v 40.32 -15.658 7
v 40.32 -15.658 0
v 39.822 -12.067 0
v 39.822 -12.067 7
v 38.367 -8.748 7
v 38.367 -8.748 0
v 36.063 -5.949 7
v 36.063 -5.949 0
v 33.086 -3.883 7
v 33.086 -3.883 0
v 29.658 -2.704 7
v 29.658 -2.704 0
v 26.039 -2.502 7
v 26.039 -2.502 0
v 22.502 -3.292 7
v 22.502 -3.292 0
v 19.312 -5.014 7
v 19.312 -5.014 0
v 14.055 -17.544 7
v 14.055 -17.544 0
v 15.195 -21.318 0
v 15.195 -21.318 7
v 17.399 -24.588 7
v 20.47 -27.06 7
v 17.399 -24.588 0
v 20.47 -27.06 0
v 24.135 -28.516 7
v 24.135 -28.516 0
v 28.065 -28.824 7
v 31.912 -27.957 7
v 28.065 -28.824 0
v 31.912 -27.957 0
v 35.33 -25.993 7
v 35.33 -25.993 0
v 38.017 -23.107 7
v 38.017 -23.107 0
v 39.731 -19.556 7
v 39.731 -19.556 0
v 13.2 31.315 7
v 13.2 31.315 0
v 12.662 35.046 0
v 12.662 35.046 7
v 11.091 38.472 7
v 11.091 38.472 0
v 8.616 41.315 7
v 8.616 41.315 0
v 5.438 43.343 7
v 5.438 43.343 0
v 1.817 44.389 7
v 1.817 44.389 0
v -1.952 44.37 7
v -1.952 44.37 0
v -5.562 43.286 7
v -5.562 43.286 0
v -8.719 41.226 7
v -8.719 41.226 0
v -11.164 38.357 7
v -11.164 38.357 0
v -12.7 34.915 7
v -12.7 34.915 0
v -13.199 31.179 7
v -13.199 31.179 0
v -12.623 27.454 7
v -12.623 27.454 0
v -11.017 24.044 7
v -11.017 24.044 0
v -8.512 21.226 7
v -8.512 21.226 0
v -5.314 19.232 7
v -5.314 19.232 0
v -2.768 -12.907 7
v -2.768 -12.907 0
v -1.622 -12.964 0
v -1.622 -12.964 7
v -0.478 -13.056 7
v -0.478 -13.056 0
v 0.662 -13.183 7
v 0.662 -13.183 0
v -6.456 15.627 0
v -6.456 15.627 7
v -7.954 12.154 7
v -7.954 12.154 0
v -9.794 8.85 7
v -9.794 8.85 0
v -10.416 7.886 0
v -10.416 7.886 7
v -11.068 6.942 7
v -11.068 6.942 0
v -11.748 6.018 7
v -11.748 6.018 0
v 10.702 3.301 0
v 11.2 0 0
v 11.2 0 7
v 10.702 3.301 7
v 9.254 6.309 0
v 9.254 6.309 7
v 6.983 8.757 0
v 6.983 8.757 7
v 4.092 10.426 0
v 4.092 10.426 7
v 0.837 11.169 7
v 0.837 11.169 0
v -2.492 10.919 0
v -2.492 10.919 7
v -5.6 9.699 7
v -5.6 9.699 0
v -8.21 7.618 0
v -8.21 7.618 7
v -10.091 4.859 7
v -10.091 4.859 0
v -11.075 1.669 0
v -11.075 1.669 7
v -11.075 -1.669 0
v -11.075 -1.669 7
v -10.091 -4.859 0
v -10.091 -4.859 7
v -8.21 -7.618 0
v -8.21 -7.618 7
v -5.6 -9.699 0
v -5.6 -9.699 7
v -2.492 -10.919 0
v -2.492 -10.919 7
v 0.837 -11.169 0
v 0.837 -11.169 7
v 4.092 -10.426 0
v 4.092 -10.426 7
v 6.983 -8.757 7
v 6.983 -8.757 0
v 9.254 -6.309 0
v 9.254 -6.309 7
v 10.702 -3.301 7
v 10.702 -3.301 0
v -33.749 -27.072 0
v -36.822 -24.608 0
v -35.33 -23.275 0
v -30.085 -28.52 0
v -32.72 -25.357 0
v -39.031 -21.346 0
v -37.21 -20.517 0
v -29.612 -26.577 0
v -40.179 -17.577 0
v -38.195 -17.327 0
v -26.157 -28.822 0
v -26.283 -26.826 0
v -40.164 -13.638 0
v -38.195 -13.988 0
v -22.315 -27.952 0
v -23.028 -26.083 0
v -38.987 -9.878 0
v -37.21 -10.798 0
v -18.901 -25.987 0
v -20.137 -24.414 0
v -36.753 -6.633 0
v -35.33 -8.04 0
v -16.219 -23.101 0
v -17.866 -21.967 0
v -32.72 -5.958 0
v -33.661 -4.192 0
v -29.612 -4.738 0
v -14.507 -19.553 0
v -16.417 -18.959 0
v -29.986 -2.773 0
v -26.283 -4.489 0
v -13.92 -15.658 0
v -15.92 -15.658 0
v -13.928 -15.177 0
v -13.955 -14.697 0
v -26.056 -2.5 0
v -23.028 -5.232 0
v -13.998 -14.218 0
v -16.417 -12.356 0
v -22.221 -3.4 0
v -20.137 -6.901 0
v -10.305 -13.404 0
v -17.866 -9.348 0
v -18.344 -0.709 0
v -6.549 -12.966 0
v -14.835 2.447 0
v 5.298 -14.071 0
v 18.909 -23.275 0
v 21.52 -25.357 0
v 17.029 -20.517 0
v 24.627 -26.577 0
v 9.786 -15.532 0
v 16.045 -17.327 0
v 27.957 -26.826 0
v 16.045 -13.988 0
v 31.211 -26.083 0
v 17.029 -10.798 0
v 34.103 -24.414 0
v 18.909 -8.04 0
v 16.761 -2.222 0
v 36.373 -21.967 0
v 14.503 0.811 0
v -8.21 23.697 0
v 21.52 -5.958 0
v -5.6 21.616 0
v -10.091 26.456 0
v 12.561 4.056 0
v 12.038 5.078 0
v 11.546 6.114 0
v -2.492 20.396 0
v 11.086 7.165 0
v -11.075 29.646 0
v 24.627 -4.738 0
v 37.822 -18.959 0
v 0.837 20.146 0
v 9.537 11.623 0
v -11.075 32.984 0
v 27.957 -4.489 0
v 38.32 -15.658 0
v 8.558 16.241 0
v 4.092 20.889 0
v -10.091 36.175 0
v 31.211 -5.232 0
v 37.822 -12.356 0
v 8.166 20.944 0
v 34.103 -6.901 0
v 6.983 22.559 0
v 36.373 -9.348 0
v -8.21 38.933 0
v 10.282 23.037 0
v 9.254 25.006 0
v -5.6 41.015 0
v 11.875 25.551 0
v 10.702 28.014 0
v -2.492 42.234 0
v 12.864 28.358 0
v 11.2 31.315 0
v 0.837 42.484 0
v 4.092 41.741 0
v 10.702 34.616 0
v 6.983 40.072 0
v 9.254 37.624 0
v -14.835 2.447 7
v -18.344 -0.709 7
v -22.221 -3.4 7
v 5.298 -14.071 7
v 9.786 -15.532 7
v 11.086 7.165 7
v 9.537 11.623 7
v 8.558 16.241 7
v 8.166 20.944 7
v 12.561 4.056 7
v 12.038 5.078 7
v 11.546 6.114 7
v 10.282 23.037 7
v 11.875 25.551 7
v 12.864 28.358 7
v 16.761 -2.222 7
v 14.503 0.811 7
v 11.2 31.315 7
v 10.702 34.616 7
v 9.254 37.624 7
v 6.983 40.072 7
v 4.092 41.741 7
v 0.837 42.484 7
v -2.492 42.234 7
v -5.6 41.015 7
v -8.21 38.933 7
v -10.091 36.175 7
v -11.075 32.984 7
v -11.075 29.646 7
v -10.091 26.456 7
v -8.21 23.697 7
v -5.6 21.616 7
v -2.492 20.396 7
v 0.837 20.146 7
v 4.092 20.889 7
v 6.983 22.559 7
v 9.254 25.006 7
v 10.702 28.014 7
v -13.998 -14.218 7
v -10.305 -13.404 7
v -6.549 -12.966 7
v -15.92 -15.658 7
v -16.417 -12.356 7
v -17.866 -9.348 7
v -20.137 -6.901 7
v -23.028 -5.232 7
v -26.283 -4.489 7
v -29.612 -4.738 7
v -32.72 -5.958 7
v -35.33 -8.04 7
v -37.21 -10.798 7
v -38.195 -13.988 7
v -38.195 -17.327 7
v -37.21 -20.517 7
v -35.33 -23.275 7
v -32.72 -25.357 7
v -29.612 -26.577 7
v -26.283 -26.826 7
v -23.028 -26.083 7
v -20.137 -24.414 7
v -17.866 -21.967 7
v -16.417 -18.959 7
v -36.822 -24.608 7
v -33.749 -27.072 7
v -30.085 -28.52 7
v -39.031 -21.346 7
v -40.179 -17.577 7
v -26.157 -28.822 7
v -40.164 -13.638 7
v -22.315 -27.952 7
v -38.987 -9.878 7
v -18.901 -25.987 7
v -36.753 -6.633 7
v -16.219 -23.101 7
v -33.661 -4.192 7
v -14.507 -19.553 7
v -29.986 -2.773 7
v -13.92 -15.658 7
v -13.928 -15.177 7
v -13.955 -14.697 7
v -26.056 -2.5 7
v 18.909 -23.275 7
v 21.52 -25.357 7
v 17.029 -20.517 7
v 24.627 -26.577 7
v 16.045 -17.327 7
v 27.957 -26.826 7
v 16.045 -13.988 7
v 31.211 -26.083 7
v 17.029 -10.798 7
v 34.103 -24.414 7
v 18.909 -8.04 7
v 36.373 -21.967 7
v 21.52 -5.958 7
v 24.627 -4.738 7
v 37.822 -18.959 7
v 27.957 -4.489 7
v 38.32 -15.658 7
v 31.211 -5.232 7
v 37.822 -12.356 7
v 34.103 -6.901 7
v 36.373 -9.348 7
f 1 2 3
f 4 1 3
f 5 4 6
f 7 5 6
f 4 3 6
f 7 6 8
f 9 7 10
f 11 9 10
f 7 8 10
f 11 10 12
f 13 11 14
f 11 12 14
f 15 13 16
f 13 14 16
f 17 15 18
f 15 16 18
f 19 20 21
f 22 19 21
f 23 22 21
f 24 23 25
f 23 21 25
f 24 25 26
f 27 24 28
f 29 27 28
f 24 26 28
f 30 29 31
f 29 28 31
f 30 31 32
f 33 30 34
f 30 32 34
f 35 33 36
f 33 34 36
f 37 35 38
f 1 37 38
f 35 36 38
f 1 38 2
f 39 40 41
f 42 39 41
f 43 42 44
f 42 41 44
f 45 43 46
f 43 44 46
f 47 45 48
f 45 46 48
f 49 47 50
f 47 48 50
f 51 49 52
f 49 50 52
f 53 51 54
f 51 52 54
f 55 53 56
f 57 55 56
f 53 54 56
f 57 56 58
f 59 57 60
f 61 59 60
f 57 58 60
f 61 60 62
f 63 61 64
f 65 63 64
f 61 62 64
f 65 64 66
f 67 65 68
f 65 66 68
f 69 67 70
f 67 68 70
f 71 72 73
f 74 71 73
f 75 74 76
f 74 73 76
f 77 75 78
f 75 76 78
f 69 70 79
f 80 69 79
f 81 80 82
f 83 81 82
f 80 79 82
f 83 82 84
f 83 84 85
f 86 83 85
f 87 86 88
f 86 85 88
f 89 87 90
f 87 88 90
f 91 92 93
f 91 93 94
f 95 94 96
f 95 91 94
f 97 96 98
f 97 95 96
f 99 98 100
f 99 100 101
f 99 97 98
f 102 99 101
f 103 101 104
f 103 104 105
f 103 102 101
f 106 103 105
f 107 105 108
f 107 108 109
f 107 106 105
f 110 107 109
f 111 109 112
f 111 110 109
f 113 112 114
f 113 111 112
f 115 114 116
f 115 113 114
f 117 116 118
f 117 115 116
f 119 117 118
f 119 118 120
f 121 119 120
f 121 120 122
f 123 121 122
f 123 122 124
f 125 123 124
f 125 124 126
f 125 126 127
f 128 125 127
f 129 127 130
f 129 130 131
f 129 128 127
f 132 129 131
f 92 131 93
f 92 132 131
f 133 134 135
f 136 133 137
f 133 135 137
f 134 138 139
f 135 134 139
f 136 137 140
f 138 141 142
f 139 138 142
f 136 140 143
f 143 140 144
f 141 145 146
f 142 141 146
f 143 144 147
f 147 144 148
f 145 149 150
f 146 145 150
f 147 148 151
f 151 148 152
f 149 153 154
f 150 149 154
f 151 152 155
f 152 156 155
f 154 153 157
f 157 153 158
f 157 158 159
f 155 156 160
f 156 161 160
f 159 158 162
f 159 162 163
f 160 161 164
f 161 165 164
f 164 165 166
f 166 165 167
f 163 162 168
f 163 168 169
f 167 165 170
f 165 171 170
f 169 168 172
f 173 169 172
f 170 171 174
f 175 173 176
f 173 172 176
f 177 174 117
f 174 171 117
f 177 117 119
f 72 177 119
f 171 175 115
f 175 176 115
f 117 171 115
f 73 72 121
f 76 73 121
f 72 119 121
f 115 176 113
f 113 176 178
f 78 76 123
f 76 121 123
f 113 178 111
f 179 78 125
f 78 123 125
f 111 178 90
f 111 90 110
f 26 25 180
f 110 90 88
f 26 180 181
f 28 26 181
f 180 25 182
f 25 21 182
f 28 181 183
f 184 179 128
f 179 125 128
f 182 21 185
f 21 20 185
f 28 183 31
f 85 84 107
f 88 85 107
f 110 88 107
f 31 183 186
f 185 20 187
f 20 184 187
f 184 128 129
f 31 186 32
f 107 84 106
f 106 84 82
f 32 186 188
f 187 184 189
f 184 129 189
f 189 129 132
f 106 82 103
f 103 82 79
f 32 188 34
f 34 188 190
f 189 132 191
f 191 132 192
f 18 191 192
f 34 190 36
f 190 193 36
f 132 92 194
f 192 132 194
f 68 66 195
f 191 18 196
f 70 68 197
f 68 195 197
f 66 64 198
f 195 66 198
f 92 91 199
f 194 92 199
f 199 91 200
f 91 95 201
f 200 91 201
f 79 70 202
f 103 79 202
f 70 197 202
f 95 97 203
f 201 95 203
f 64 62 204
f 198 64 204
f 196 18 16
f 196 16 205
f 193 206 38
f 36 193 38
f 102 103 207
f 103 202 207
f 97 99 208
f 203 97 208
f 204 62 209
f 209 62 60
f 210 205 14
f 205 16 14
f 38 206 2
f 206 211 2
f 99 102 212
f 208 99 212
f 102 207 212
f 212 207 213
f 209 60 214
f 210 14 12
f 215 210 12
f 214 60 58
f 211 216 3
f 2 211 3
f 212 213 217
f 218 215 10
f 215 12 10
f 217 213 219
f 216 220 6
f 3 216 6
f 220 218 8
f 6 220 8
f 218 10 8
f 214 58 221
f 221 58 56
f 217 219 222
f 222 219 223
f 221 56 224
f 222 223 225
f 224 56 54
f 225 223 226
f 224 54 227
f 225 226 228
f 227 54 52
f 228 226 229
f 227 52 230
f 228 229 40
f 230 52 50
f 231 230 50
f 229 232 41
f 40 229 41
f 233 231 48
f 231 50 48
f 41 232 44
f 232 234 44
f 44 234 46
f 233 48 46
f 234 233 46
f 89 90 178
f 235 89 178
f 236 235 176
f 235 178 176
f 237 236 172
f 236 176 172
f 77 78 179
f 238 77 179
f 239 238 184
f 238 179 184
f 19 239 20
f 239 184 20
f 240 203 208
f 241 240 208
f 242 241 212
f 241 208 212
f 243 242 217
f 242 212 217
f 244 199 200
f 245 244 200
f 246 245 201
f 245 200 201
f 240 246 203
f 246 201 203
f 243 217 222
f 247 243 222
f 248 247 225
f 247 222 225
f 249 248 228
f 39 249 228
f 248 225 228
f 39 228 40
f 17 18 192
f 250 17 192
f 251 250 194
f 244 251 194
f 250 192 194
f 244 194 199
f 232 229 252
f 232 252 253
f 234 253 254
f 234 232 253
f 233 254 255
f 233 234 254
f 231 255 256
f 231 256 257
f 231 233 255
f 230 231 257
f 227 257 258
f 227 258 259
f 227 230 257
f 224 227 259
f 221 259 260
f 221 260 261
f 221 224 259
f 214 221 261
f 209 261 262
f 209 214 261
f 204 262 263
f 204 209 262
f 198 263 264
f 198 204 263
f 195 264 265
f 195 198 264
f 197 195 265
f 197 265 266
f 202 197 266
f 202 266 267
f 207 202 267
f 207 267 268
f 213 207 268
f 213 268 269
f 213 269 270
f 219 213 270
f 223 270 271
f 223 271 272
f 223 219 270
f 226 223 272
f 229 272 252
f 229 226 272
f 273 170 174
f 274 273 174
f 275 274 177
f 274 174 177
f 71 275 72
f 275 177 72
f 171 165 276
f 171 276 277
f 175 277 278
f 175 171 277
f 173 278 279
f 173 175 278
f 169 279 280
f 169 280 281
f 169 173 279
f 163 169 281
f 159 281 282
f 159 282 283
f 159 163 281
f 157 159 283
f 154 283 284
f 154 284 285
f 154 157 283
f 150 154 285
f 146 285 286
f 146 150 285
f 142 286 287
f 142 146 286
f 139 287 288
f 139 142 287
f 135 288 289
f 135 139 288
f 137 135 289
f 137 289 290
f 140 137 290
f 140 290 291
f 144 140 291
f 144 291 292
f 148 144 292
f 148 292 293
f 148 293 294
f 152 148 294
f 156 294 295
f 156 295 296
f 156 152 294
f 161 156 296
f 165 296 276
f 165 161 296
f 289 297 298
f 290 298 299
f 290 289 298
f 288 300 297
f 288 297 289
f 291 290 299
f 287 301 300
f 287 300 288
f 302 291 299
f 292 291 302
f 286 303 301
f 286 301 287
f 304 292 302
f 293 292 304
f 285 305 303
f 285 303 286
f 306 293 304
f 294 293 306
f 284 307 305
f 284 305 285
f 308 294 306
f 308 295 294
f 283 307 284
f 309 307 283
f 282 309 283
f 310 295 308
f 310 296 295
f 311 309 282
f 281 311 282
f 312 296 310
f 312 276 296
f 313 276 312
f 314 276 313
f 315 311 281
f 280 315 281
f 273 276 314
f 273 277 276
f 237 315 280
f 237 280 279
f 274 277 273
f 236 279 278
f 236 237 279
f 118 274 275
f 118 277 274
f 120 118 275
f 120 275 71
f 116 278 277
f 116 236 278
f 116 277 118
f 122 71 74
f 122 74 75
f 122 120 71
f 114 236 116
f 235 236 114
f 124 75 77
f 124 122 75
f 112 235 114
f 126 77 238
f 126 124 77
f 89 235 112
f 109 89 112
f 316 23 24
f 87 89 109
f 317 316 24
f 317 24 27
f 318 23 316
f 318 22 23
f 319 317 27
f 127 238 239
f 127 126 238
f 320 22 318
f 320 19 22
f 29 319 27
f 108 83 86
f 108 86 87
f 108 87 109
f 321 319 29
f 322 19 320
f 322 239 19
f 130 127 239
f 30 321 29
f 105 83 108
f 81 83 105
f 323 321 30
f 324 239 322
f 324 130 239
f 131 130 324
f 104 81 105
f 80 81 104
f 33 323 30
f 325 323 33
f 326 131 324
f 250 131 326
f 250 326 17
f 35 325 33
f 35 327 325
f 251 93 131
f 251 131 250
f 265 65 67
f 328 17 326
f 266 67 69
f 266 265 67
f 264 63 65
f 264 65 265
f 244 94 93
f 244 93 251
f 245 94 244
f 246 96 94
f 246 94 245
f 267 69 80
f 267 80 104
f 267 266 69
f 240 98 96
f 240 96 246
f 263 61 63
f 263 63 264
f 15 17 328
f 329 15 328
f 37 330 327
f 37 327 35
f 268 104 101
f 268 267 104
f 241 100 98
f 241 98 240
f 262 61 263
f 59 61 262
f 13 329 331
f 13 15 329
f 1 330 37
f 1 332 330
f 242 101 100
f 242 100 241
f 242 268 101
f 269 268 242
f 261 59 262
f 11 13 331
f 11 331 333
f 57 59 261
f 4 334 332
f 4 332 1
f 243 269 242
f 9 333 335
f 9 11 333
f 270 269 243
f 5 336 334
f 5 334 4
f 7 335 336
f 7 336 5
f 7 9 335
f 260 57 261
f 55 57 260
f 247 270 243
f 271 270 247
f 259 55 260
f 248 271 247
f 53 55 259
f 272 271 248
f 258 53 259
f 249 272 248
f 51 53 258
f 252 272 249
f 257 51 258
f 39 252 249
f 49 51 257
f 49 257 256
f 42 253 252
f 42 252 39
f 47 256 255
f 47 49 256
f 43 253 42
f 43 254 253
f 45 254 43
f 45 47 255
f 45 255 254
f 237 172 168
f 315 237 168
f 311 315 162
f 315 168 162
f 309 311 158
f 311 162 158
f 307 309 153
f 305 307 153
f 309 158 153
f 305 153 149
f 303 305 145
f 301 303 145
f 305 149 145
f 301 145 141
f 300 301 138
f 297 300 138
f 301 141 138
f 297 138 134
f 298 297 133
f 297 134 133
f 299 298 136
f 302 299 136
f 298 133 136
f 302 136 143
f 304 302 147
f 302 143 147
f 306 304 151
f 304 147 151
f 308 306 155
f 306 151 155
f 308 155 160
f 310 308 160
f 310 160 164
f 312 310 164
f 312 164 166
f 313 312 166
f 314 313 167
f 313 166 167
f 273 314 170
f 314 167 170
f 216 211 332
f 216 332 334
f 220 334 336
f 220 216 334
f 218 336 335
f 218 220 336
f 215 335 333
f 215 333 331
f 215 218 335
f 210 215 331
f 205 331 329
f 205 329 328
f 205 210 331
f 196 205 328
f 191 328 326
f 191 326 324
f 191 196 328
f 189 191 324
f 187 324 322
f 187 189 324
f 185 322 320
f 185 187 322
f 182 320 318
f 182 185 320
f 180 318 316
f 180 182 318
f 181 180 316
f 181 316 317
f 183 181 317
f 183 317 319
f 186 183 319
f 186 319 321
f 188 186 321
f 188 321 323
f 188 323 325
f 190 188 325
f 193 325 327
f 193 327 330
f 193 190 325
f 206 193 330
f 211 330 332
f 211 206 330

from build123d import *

# Parameters (mm, degrees)
F0_R     = 11.2
F1_DEPTH = 7


with BuildPart() as f1:
    # F0 (on Top) → F1 (new body)
    with BuildSketch(Plane.XY):
        with BuildLine():
            ThreePointArc((-5.3140176456, 19.2319211805), (1.6632130225, 18.2202199581), (8.1659804164, 20.9440597808))
            ThreePointArc((8.1659804164, 20.9440597808), (11.8749935052, 25.5509452113), (13.2, 31.3150174916))
            ThreePointArc((13.2, 31.3150174916), (-7.2143941907, 42.3690898842), (-5.3140176456, 19.2319211805))
        make_face()
        with Locations((0, 31.3150174916)):
            Circle(F0_R, mode=Mode.SUBTRACT)
        with BuildLine():
            ThreePointArc((-13.9196006677, -15.6575087458), (-13.939296065, -14.9366963), (-13.9983234831, -14.2180348675))
            ThreePointArc((-13.9983234831, -14.2180348675), (-16.6107798575, -7.6697252497), (-22.2210780368, -3.400083403))
            ThreePointArc((-22.2210780368, -3.400083403), (-38.0489304442, -23.0595186509), (-13.9196006677, -15.6575087458))
        make_face()
        with Locations((-27.1196006677, -15.6575087458)):
            Circle(F0_R, mode=Mode.SUBTRACT)
        with BuildLine():
            ThreePointArc((0.6623638429, -13.183371122), (9.565124221, -9.09661468), (13.2, 0))
            ThreePointArc((13.2, 0), (13.0393347088, 2.0532292498), (12.5612499466, 4.0564762761))
            ThreePointArc((12.5612499466, 4.0564762761), (11.7880076827, 5.5940019812), (11.0859523777, 7.1653094754))
            ThreePointArc((11.0859523777, 7.1653094754), (1.0616824394, 13.157234907), (-9.7936364782, 8.850123419))
            ThreePointArc((-9.7936364782, 8.850123419), (-10.7385516659, 7.4117131226), (-11.7483162206, 6.0180616465))
            ThreePointArc((-11.7483162206, 6.0180616465), (-11.9253408927, -5.6591734902), (-2.7676134684, -12.9065996951))
            ThreePointArc((-2.7676134684, -12.9065996951), (-1.0494560168, -13.0057151038), (0.6623638429, -13.183371122))
        make_face()
        Circle(F0_R, mode=Mode.SUBTRACT)
        with BuildLine():
            ThreePointArc((12.5612499466, 4.0564762761), (13.0393347088, 2.0532292498), (13.2, 0))
            ThreePointArc((13.2, 0), (9.565124221, -9.09661468), (0.6623638429, -13.183371122))
            ThreePointArc((0.6623638429, -13.183371122), (7.5647950779, -14.7307879991), (14.0550976203, -17.5439763778))
            ThreePointArc((14.0550976203, -17.5439763778), (14.947566835, -10.5504947085), (19.3123411287, -5.013886313))
            ThreePointArc((19.3123411287, -5.013886313), (15.5937950375, -0.7340010586), (12.5612499466, 4.0564762761))
        make_face()
        with BuildLine():
            ThreePointArc((40.3196006677, -15.6575087458), (33.0855110796, -3.8826239074), (19.3123411287, -5.013886313))
            ThreePointArc((19.3123411287, -5.013886313), (14.947566835, -10.5504947085), (14.0550976203, -17.5439763778))
            ThreePointArc((14.0550976203, -17.5439763778), (28.0652643963, -28.8235909312), (40.3196006677, -15.6575087458))
        make_face()
        with Locations((27.1196006677, -15.6575087458)):
            Circle(F0_R, mode=Mode.SUBTRACT)
        with BuildLine():
            ThreePointArc((-9.7936364782, 8.850123419), (1.0616824394, 13.157234907), (11.0859523777, 7.1653094754))
            ThreePointArc((11.0859523777, 7.1653094754), (8.9748390861, 13.9166987115), (8.1659804164, 20.9440597808))
            ThreePointArc((8.1659804164, 20.9440597808), (1.6632130225, 18.2202199581), (-5.3140176456, 19.2319211805))
            ThreePointArc((-5.3140176456, 19.2319211805), (-7.1612339556, 13.8716231732), (-9.7936364782, 8.850123419))
        make_face()
        with BuildLine():
            ThreePointArc((-13.9983234831, -14.2180348675), (-8.432561082, -13.1376221146), (-2.7676134684, -12.9065996951))
            ThreePointArc((-2.7676134684, -12.9065996951), (-11.9253408927, -5.6591734902), (-11.7483162206, 6.0180616465))
            ThreePointArc((-11.7483162206, 6.0180616465), (-16.539634164, 0.8140892877), (-22.2210780368, -3.400083403))
            ThreePointArc((-22.2210780368, -3.400083403), (-16.6107798575, -7.6697252497), (-13.9983234831, -14.2180348675))
        make_face()
    extrude(amount=F1_DEPTH)


solid = f1.part
